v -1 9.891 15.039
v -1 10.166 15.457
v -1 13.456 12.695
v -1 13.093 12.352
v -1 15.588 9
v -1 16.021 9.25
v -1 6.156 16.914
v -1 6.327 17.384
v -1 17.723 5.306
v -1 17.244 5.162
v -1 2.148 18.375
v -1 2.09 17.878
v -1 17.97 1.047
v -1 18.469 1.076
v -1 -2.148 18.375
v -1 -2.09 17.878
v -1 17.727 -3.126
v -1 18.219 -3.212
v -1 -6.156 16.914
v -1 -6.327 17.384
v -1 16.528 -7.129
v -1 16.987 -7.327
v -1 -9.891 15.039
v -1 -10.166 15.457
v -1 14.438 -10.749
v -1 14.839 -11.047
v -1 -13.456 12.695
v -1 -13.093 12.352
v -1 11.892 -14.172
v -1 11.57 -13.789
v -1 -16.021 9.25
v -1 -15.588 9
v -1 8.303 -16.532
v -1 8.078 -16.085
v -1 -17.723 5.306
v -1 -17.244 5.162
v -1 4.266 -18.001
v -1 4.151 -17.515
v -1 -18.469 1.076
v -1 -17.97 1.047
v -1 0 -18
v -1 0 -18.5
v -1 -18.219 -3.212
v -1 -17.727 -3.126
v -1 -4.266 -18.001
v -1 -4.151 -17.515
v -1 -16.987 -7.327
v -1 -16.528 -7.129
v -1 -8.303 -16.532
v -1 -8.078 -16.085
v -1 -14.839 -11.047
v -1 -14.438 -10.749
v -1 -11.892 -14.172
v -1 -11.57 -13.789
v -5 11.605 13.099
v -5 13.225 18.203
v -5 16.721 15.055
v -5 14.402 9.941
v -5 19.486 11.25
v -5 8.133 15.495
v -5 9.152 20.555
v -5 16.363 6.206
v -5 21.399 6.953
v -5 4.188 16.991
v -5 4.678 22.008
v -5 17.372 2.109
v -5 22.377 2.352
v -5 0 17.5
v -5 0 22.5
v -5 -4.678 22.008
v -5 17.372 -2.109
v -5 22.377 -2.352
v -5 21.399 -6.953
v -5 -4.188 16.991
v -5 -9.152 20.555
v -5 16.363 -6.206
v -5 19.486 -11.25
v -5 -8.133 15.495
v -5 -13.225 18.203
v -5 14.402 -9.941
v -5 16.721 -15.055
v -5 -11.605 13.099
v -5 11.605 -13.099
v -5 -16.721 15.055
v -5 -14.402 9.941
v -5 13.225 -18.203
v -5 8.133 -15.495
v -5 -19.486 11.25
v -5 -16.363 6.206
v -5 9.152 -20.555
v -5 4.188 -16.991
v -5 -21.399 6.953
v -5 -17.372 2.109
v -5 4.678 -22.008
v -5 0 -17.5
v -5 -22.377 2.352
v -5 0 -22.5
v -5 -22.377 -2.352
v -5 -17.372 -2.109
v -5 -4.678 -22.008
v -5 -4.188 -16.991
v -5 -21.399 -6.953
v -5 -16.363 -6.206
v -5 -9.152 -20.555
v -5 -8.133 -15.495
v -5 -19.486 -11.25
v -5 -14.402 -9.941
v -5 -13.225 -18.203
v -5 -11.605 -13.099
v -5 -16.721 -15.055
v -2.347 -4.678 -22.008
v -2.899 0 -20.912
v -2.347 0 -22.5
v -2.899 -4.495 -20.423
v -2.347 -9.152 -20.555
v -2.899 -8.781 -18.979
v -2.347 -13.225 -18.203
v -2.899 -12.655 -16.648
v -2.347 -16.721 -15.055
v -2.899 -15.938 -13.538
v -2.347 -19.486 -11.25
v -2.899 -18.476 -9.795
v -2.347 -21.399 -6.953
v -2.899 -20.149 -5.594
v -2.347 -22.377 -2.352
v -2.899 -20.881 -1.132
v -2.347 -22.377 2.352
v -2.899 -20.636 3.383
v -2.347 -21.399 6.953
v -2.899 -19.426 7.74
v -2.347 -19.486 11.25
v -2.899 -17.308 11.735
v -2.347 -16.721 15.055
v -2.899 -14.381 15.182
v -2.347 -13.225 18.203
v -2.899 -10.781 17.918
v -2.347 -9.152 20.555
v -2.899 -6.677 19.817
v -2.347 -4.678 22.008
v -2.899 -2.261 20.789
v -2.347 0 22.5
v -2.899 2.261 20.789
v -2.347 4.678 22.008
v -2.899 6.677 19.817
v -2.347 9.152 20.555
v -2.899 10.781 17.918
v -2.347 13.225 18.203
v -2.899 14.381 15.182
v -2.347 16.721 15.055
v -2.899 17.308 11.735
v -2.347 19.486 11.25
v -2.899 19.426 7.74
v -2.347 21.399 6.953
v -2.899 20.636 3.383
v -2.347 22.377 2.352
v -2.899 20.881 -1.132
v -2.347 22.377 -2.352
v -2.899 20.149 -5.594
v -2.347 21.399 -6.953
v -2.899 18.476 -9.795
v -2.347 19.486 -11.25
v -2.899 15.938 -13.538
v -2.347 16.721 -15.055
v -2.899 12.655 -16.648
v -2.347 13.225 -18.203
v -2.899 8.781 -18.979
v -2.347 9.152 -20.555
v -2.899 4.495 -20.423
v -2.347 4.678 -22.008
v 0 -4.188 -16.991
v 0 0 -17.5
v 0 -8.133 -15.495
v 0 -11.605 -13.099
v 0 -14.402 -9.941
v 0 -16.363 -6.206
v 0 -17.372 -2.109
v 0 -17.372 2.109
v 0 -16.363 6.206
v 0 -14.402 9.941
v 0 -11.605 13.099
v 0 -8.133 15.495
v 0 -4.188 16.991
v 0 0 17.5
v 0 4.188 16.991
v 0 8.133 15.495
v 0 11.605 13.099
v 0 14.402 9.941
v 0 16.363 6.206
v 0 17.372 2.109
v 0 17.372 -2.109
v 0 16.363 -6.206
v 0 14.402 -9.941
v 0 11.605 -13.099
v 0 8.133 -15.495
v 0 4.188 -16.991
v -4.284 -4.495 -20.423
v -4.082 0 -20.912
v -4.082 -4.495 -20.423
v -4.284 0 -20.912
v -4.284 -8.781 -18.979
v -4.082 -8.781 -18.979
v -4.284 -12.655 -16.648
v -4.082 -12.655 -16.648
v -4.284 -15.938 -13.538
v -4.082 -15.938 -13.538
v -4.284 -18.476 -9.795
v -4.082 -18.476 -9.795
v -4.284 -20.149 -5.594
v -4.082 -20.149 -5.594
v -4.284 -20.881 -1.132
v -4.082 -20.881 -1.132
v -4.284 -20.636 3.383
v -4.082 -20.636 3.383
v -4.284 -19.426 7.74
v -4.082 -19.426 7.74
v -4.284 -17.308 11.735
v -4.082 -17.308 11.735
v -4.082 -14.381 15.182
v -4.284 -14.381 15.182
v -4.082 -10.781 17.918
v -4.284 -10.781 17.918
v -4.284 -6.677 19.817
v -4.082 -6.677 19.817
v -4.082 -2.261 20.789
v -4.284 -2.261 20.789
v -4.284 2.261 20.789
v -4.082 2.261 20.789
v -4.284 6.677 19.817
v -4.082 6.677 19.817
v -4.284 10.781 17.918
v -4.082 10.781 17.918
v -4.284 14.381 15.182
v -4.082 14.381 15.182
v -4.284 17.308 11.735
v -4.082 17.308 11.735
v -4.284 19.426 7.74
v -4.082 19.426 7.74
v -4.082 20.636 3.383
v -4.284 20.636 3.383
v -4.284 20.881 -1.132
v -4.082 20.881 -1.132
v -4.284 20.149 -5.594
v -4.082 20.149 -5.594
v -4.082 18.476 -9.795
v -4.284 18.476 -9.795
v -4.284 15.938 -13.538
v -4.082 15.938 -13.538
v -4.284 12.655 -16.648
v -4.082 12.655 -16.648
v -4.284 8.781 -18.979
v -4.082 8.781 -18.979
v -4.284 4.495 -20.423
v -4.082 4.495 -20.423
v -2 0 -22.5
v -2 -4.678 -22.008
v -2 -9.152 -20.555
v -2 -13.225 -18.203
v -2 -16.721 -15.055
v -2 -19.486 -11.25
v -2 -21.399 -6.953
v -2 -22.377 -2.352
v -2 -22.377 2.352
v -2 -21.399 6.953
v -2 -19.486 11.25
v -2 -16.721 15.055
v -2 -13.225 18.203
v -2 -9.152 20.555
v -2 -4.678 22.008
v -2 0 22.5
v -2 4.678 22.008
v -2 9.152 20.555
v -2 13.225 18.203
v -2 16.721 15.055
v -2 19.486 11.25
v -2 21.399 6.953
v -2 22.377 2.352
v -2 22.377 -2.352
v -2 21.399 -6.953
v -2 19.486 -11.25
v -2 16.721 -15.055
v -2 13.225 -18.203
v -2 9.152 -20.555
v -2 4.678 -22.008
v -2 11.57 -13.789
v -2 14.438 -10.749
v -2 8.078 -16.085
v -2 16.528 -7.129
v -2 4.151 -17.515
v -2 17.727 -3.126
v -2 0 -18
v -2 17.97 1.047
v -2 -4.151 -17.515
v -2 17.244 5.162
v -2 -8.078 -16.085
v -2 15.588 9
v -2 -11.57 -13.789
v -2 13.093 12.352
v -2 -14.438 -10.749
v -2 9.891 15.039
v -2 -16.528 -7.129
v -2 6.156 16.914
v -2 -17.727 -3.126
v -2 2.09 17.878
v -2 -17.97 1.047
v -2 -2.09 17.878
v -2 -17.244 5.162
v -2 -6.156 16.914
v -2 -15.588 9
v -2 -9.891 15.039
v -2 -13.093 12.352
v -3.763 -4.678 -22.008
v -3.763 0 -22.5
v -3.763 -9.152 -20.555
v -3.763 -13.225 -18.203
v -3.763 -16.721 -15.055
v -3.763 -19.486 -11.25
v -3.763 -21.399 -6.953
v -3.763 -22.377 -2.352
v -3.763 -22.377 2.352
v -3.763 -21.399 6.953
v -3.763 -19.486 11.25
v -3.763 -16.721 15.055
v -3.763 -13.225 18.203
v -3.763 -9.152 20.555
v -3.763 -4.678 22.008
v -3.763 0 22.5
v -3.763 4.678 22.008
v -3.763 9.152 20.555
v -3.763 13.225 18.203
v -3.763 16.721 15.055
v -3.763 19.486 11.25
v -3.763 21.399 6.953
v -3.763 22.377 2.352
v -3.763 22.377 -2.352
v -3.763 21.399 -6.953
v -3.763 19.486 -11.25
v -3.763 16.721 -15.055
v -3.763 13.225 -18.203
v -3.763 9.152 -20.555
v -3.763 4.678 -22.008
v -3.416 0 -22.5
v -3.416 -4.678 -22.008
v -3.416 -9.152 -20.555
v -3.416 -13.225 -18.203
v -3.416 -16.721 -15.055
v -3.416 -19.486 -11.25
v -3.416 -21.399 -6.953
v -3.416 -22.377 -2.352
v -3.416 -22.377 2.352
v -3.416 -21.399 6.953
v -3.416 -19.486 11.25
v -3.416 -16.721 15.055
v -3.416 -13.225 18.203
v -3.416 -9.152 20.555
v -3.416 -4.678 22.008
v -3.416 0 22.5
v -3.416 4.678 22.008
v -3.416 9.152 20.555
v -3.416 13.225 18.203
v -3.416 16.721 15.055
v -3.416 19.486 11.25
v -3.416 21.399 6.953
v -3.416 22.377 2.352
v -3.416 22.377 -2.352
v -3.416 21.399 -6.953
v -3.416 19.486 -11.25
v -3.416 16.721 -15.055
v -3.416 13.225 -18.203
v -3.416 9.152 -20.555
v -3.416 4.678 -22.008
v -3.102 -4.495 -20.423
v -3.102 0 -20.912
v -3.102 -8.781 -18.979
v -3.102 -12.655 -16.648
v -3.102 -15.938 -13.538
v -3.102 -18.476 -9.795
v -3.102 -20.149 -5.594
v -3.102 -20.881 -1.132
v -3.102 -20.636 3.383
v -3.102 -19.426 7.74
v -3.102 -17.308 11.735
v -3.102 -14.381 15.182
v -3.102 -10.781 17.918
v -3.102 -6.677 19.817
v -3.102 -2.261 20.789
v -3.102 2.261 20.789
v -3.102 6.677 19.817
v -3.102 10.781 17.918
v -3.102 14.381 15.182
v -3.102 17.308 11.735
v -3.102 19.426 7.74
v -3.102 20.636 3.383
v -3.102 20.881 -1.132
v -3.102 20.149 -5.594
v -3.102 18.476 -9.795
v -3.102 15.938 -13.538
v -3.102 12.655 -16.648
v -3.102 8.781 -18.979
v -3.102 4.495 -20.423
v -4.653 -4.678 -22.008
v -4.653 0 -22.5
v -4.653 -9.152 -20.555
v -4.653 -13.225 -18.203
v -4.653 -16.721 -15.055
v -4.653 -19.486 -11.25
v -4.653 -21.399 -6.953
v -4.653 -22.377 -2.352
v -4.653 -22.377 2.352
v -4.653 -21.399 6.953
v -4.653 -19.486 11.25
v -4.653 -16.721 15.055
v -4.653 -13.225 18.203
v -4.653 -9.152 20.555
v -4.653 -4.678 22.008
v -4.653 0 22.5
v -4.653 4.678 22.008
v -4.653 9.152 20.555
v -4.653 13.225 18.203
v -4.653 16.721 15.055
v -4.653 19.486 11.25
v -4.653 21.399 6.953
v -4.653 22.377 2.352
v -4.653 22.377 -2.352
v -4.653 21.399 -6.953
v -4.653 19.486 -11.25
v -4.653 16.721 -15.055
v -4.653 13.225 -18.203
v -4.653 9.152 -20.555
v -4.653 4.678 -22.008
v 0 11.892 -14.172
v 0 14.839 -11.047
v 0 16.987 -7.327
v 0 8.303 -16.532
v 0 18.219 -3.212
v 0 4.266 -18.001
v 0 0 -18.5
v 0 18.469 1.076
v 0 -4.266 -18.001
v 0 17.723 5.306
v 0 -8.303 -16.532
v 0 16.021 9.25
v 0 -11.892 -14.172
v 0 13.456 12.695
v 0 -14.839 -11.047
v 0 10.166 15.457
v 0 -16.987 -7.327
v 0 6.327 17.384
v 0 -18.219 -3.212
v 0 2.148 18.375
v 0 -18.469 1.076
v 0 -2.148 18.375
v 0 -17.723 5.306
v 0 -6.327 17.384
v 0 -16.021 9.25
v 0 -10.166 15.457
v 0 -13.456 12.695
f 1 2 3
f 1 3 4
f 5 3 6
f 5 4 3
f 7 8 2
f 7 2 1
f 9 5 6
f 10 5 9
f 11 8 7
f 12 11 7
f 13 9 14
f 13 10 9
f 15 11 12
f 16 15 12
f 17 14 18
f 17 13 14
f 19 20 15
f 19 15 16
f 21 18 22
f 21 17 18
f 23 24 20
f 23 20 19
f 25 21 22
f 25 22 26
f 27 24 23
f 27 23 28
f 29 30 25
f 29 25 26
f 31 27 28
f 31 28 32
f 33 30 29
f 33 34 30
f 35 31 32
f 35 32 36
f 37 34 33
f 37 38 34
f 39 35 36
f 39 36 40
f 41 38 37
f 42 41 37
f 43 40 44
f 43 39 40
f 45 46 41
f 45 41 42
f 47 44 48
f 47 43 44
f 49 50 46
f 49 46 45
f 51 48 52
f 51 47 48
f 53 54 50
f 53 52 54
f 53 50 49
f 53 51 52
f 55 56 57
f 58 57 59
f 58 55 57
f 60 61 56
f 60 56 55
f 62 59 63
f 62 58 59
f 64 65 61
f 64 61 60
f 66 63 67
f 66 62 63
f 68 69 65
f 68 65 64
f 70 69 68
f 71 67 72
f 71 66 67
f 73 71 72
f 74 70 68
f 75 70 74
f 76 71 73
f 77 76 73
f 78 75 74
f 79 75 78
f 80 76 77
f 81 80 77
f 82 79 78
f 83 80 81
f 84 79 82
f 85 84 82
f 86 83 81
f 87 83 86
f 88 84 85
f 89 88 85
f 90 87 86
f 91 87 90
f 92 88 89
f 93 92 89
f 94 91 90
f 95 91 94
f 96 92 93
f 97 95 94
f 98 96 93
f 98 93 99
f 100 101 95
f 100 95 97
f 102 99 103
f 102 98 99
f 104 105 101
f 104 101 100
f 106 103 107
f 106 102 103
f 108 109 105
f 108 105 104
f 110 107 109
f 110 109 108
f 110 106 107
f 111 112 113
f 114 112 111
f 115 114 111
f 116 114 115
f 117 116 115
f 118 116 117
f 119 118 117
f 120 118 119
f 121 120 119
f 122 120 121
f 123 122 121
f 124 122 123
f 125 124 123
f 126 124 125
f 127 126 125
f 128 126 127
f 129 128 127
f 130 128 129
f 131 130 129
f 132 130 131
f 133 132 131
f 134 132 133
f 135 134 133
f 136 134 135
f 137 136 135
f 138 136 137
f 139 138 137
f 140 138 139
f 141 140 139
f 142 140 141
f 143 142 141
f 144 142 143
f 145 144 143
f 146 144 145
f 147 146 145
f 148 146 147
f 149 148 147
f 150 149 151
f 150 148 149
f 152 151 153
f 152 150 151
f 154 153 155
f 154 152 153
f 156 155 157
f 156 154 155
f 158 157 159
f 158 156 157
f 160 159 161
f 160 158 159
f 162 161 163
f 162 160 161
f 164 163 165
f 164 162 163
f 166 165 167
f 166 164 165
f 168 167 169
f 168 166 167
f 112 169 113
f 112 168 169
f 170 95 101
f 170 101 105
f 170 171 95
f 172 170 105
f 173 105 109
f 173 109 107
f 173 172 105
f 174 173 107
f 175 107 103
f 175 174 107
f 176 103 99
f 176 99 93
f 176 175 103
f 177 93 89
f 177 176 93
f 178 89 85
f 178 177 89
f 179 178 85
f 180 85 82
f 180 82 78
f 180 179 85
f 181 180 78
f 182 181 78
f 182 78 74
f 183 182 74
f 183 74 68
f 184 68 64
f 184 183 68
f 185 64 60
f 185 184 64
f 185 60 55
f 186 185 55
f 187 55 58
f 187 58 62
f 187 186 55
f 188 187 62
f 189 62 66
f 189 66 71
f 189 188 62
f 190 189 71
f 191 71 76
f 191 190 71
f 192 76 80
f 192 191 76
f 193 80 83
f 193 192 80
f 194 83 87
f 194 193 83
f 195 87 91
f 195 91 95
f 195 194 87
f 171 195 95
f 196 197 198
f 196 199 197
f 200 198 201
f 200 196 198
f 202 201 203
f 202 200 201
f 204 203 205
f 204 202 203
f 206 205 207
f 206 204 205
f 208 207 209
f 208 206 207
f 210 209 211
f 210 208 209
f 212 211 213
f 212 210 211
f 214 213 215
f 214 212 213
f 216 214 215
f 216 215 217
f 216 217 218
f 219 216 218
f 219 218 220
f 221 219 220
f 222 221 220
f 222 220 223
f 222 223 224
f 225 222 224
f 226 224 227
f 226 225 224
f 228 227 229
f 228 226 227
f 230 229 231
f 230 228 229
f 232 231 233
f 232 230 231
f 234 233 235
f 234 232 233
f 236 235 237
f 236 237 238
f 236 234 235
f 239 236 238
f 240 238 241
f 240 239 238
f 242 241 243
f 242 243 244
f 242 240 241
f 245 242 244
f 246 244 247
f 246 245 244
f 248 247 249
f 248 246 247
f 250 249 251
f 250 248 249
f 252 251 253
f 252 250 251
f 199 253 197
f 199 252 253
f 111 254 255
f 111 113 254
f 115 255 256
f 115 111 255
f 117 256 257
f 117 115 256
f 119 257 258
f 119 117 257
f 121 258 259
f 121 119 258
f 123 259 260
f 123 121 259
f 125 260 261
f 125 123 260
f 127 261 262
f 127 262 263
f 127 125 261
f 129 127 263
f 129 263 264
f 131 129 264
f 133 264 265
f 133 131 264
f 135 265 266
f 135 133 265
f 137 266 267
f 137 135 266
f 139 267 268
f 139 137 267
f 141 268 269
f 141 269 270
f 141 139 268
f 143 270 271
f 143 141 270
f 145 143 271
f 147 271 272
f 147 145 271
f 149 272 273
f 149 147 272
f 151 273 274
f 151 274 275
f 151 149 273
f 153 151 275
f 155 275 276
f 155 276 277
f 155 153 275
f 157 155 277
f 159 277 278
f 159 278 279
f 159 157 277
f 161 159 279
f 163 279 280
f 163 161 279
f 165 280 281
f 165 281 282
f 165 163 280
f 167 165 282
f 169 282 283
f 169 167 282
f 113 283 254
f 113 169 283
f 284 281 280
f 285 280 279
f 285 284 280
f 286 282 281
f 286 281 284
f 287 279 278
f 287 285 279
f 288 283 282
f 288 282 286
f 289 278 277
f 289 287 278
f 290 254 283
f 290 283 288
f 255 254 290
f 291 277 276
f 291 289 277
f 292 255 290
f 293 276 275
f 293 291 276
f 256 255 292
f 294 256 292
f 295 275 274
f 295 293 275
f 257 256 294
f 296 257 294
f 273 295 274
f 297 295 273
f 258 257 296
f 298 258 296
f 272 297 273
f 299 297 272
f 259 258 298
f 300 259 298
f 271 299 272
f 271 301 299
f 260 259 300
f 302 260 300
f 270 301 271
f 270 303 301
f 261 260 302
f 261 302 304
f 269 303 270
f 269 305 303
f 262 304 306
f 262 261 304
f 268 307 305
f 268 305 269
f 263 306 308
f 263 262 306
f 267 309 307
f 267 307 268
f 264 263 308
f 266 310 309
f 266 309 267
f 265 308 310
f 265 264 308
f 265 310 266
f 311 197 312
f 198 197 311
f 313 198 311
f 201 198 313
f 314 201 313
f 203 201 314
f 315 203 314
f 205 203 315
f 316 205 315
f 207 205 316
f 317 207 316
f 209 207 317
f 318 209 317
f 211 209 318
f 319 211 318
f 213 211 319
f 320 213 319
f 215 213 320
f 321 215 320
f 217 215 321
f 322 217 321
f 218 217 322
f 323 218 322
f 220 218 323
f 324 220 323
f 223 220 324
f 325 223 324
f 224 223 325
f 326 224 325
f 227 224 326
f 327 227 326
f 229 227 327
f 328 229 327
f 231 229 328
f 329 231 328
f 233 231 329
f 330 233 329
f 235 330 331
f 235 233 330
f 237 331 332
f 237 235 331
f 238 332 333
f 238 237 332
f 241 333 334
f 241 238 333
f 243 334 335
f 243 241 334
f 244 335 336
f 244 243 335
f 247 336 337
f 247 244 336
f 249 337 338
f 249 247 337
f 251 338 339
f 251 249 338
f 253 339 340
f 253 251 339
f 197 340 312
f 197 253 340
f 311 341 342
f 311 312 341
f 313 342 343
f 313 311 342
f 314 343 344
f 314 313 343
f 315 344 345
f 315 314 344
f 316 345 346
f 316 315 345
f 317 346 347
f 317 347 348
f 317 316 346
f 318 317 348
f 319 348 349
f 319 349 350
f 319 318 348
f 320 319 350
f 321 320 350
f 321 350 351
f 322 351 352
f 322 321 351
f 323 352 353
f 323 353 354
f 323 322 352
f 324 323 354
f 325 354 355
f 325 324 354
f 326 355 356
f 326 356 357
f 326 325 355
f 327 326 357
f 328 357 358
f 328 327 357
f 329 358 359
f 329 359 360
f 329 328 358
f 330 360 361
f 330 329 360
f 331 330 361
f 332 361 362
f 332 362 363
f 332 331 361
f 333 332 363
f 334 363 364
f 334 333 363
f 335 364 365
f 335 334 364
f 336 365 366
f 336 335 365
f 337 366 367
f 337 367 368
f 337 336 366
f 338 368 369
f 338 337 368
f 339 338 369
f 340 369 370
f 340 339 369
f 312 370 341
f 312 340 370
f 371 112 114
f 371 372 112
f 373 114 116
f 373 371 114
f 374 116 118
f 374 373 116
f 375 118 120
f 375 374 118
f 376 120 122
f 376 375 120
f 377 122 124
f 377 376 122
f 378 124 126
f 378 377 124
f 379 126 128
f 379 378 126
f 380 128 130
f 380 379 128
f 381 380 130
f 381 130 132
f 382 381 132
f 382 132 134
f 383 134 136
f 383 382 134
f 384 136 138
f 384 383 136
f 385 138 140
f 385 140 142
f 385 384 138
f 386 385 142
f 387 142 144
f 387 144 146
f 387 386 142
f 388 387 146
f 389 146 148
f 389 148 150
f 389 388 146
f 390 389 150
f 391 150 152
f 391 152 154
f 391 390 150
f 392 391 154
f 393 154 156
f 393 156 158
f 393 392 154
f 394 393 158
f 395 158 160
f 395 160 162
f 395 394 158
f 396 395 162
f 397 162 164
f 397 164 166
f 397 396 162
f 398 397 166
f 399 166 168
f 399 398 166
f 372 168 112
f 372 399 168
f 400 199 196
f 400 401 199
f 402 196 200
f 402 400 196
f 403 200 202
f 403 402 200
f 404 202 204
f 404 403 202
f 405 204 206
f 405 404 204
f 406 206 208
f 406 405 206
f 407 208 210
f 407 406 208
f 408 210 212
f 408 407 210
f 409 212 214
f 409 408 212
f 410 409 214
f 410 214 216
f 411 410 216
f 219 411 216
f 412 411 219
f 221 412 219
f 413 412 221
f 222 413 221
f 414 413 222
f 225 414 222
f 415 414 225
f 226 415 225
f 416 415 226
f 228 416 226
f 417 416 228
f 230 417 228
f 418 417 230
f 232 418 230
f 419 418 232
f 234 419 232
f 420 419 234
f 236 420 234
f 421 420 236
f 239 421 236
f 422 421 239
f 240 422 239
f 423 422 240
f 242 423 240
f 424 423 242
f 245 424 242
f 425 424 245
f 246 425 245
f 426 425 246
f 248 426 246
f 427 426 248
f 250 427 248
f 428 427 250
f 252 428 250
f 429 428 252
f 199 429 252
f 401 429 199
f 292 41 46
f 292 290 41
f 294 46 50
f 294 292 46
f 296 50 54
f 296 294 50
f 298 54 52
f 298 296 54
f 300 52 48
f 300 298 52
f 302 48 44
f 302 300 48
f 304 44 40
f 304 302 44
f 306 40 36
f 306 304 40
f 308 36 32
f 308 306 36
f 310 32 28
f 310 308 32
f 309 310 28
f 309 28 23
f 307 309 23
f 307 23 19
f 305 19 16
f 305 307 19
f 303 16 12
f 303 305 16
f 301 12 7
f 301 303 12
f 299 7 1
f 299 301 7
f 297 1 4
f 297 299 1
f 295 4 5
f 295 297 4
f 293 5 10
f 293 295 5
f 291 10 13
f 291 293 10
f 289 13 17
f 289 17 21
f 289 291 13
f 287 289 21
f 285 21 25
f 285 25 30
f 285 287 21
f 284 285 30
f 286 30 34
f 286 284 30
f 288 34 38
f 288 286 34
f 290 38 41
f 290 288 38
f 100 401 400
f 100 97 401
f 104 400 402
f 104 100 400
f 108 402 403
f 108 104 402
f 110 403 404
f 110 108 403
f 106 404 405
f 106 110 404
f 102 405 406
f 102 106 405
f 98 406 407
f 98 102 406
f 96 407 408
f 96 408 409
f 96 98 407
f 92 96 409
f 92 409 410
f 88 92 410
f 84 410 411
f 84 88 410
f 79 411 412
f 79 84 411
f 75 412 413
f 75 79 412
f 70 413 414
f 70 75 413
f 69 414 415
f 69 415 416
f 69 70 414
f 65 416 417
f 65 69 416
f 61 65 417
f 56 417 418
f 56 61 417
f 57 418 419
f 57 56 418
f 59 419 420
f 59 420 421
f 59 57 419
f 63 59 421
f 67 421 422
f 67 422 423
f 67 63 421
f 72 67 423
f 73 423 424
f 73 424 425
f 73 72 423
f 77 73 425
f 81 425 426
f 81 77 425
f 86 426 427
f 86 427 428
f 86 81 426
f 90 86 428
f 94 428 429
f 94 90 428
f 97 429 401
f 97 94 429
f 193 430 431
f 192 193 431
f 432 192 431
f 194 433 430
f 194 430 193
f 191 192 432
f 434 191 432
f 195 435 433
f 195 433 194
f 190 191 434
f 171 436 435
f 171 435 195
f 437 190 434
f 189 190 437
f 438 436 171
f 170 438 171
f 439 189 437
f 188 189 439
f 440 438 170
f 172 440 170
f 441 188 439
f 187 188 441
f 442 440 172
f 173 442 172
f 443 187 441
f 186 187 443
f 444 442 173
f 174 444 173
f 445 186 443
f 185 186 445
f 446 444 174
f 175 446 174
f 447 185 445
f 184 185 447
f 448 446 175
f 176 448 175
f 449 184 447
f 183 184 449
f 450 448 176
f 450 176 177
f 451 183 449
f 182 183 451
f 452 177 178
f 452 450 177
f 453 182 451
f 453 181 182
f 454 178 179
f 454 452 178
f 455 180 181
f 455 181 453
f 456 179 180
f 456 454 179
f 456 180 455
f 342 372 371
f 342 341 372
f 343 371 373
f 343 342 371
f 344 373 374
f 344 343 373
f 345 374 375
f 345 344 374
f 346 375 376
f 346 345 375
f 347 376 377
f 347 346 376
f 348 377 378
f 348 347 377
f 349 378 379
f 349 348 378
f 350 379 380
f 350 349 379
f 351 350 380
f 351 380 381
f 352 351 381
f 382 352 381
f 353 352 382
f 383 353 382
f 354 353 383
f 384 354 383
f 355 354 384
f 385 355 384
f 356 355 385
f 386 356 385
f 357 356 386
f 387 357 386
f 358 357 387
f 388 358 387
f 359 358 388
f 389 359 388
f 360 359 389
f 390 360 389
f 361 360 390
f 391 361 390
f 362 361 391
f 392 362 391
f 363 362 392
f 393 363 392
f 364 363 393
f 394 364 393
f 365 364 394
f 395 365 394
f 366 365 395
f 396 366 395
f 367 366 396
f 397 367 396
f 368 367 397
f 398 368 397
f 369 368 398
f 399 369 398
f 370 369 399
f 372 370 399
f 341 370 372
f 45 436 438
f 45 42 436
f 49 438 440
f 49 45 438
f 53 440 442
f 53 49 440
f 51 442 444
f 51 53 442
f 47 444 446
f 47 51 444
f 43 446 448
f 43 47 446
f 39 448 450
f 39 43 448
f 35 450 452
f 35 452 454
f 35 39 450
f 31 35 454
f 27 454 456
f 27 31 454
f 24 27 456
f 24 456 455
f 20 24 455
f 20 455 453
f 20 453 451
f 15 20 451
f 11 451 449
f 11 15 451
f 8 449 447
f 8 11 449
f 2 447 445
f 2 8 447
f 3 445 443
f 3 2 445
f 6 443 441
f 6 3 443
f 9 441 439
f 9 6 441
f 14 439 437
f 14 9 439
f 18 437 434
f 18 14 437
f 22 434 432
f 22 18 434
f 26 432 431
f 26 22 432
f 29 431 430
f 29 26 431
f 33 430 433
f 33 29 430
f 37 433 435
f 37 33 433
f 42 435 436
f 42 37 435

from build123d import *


with BuildPart() as part:
    # Szkic1 → Obrót1 (revolve)
    with BuildSketch(Plane.XY, mode=Mode.PRIVATE) as obr_t1_sk:
        Polygon((-4.081701013, 20.911565577), (-4.283998784, 20.911565577), (-4.652565061, 22.5), (-5, 22.5), (-5, 17.5), (0, 17.5), (0, 18.5), (-1, 18.5), (-1, 18), (-2, 18), (-2, 22.5), (-2.347434939, 22.5), (-2.899277053, 20.911565577), (-3.101574823, 20.911565577), (-3.415520415, 22.5), (-3.762955354, 22.5), align=None)
    revolve(obr_t1_sk.sketch.rotate(Axis((0, 0, 0), (-1, 0, 0)), 90), axis=Axis((0, 0, 0), (-1, 0, 0)))


solid = part.part
